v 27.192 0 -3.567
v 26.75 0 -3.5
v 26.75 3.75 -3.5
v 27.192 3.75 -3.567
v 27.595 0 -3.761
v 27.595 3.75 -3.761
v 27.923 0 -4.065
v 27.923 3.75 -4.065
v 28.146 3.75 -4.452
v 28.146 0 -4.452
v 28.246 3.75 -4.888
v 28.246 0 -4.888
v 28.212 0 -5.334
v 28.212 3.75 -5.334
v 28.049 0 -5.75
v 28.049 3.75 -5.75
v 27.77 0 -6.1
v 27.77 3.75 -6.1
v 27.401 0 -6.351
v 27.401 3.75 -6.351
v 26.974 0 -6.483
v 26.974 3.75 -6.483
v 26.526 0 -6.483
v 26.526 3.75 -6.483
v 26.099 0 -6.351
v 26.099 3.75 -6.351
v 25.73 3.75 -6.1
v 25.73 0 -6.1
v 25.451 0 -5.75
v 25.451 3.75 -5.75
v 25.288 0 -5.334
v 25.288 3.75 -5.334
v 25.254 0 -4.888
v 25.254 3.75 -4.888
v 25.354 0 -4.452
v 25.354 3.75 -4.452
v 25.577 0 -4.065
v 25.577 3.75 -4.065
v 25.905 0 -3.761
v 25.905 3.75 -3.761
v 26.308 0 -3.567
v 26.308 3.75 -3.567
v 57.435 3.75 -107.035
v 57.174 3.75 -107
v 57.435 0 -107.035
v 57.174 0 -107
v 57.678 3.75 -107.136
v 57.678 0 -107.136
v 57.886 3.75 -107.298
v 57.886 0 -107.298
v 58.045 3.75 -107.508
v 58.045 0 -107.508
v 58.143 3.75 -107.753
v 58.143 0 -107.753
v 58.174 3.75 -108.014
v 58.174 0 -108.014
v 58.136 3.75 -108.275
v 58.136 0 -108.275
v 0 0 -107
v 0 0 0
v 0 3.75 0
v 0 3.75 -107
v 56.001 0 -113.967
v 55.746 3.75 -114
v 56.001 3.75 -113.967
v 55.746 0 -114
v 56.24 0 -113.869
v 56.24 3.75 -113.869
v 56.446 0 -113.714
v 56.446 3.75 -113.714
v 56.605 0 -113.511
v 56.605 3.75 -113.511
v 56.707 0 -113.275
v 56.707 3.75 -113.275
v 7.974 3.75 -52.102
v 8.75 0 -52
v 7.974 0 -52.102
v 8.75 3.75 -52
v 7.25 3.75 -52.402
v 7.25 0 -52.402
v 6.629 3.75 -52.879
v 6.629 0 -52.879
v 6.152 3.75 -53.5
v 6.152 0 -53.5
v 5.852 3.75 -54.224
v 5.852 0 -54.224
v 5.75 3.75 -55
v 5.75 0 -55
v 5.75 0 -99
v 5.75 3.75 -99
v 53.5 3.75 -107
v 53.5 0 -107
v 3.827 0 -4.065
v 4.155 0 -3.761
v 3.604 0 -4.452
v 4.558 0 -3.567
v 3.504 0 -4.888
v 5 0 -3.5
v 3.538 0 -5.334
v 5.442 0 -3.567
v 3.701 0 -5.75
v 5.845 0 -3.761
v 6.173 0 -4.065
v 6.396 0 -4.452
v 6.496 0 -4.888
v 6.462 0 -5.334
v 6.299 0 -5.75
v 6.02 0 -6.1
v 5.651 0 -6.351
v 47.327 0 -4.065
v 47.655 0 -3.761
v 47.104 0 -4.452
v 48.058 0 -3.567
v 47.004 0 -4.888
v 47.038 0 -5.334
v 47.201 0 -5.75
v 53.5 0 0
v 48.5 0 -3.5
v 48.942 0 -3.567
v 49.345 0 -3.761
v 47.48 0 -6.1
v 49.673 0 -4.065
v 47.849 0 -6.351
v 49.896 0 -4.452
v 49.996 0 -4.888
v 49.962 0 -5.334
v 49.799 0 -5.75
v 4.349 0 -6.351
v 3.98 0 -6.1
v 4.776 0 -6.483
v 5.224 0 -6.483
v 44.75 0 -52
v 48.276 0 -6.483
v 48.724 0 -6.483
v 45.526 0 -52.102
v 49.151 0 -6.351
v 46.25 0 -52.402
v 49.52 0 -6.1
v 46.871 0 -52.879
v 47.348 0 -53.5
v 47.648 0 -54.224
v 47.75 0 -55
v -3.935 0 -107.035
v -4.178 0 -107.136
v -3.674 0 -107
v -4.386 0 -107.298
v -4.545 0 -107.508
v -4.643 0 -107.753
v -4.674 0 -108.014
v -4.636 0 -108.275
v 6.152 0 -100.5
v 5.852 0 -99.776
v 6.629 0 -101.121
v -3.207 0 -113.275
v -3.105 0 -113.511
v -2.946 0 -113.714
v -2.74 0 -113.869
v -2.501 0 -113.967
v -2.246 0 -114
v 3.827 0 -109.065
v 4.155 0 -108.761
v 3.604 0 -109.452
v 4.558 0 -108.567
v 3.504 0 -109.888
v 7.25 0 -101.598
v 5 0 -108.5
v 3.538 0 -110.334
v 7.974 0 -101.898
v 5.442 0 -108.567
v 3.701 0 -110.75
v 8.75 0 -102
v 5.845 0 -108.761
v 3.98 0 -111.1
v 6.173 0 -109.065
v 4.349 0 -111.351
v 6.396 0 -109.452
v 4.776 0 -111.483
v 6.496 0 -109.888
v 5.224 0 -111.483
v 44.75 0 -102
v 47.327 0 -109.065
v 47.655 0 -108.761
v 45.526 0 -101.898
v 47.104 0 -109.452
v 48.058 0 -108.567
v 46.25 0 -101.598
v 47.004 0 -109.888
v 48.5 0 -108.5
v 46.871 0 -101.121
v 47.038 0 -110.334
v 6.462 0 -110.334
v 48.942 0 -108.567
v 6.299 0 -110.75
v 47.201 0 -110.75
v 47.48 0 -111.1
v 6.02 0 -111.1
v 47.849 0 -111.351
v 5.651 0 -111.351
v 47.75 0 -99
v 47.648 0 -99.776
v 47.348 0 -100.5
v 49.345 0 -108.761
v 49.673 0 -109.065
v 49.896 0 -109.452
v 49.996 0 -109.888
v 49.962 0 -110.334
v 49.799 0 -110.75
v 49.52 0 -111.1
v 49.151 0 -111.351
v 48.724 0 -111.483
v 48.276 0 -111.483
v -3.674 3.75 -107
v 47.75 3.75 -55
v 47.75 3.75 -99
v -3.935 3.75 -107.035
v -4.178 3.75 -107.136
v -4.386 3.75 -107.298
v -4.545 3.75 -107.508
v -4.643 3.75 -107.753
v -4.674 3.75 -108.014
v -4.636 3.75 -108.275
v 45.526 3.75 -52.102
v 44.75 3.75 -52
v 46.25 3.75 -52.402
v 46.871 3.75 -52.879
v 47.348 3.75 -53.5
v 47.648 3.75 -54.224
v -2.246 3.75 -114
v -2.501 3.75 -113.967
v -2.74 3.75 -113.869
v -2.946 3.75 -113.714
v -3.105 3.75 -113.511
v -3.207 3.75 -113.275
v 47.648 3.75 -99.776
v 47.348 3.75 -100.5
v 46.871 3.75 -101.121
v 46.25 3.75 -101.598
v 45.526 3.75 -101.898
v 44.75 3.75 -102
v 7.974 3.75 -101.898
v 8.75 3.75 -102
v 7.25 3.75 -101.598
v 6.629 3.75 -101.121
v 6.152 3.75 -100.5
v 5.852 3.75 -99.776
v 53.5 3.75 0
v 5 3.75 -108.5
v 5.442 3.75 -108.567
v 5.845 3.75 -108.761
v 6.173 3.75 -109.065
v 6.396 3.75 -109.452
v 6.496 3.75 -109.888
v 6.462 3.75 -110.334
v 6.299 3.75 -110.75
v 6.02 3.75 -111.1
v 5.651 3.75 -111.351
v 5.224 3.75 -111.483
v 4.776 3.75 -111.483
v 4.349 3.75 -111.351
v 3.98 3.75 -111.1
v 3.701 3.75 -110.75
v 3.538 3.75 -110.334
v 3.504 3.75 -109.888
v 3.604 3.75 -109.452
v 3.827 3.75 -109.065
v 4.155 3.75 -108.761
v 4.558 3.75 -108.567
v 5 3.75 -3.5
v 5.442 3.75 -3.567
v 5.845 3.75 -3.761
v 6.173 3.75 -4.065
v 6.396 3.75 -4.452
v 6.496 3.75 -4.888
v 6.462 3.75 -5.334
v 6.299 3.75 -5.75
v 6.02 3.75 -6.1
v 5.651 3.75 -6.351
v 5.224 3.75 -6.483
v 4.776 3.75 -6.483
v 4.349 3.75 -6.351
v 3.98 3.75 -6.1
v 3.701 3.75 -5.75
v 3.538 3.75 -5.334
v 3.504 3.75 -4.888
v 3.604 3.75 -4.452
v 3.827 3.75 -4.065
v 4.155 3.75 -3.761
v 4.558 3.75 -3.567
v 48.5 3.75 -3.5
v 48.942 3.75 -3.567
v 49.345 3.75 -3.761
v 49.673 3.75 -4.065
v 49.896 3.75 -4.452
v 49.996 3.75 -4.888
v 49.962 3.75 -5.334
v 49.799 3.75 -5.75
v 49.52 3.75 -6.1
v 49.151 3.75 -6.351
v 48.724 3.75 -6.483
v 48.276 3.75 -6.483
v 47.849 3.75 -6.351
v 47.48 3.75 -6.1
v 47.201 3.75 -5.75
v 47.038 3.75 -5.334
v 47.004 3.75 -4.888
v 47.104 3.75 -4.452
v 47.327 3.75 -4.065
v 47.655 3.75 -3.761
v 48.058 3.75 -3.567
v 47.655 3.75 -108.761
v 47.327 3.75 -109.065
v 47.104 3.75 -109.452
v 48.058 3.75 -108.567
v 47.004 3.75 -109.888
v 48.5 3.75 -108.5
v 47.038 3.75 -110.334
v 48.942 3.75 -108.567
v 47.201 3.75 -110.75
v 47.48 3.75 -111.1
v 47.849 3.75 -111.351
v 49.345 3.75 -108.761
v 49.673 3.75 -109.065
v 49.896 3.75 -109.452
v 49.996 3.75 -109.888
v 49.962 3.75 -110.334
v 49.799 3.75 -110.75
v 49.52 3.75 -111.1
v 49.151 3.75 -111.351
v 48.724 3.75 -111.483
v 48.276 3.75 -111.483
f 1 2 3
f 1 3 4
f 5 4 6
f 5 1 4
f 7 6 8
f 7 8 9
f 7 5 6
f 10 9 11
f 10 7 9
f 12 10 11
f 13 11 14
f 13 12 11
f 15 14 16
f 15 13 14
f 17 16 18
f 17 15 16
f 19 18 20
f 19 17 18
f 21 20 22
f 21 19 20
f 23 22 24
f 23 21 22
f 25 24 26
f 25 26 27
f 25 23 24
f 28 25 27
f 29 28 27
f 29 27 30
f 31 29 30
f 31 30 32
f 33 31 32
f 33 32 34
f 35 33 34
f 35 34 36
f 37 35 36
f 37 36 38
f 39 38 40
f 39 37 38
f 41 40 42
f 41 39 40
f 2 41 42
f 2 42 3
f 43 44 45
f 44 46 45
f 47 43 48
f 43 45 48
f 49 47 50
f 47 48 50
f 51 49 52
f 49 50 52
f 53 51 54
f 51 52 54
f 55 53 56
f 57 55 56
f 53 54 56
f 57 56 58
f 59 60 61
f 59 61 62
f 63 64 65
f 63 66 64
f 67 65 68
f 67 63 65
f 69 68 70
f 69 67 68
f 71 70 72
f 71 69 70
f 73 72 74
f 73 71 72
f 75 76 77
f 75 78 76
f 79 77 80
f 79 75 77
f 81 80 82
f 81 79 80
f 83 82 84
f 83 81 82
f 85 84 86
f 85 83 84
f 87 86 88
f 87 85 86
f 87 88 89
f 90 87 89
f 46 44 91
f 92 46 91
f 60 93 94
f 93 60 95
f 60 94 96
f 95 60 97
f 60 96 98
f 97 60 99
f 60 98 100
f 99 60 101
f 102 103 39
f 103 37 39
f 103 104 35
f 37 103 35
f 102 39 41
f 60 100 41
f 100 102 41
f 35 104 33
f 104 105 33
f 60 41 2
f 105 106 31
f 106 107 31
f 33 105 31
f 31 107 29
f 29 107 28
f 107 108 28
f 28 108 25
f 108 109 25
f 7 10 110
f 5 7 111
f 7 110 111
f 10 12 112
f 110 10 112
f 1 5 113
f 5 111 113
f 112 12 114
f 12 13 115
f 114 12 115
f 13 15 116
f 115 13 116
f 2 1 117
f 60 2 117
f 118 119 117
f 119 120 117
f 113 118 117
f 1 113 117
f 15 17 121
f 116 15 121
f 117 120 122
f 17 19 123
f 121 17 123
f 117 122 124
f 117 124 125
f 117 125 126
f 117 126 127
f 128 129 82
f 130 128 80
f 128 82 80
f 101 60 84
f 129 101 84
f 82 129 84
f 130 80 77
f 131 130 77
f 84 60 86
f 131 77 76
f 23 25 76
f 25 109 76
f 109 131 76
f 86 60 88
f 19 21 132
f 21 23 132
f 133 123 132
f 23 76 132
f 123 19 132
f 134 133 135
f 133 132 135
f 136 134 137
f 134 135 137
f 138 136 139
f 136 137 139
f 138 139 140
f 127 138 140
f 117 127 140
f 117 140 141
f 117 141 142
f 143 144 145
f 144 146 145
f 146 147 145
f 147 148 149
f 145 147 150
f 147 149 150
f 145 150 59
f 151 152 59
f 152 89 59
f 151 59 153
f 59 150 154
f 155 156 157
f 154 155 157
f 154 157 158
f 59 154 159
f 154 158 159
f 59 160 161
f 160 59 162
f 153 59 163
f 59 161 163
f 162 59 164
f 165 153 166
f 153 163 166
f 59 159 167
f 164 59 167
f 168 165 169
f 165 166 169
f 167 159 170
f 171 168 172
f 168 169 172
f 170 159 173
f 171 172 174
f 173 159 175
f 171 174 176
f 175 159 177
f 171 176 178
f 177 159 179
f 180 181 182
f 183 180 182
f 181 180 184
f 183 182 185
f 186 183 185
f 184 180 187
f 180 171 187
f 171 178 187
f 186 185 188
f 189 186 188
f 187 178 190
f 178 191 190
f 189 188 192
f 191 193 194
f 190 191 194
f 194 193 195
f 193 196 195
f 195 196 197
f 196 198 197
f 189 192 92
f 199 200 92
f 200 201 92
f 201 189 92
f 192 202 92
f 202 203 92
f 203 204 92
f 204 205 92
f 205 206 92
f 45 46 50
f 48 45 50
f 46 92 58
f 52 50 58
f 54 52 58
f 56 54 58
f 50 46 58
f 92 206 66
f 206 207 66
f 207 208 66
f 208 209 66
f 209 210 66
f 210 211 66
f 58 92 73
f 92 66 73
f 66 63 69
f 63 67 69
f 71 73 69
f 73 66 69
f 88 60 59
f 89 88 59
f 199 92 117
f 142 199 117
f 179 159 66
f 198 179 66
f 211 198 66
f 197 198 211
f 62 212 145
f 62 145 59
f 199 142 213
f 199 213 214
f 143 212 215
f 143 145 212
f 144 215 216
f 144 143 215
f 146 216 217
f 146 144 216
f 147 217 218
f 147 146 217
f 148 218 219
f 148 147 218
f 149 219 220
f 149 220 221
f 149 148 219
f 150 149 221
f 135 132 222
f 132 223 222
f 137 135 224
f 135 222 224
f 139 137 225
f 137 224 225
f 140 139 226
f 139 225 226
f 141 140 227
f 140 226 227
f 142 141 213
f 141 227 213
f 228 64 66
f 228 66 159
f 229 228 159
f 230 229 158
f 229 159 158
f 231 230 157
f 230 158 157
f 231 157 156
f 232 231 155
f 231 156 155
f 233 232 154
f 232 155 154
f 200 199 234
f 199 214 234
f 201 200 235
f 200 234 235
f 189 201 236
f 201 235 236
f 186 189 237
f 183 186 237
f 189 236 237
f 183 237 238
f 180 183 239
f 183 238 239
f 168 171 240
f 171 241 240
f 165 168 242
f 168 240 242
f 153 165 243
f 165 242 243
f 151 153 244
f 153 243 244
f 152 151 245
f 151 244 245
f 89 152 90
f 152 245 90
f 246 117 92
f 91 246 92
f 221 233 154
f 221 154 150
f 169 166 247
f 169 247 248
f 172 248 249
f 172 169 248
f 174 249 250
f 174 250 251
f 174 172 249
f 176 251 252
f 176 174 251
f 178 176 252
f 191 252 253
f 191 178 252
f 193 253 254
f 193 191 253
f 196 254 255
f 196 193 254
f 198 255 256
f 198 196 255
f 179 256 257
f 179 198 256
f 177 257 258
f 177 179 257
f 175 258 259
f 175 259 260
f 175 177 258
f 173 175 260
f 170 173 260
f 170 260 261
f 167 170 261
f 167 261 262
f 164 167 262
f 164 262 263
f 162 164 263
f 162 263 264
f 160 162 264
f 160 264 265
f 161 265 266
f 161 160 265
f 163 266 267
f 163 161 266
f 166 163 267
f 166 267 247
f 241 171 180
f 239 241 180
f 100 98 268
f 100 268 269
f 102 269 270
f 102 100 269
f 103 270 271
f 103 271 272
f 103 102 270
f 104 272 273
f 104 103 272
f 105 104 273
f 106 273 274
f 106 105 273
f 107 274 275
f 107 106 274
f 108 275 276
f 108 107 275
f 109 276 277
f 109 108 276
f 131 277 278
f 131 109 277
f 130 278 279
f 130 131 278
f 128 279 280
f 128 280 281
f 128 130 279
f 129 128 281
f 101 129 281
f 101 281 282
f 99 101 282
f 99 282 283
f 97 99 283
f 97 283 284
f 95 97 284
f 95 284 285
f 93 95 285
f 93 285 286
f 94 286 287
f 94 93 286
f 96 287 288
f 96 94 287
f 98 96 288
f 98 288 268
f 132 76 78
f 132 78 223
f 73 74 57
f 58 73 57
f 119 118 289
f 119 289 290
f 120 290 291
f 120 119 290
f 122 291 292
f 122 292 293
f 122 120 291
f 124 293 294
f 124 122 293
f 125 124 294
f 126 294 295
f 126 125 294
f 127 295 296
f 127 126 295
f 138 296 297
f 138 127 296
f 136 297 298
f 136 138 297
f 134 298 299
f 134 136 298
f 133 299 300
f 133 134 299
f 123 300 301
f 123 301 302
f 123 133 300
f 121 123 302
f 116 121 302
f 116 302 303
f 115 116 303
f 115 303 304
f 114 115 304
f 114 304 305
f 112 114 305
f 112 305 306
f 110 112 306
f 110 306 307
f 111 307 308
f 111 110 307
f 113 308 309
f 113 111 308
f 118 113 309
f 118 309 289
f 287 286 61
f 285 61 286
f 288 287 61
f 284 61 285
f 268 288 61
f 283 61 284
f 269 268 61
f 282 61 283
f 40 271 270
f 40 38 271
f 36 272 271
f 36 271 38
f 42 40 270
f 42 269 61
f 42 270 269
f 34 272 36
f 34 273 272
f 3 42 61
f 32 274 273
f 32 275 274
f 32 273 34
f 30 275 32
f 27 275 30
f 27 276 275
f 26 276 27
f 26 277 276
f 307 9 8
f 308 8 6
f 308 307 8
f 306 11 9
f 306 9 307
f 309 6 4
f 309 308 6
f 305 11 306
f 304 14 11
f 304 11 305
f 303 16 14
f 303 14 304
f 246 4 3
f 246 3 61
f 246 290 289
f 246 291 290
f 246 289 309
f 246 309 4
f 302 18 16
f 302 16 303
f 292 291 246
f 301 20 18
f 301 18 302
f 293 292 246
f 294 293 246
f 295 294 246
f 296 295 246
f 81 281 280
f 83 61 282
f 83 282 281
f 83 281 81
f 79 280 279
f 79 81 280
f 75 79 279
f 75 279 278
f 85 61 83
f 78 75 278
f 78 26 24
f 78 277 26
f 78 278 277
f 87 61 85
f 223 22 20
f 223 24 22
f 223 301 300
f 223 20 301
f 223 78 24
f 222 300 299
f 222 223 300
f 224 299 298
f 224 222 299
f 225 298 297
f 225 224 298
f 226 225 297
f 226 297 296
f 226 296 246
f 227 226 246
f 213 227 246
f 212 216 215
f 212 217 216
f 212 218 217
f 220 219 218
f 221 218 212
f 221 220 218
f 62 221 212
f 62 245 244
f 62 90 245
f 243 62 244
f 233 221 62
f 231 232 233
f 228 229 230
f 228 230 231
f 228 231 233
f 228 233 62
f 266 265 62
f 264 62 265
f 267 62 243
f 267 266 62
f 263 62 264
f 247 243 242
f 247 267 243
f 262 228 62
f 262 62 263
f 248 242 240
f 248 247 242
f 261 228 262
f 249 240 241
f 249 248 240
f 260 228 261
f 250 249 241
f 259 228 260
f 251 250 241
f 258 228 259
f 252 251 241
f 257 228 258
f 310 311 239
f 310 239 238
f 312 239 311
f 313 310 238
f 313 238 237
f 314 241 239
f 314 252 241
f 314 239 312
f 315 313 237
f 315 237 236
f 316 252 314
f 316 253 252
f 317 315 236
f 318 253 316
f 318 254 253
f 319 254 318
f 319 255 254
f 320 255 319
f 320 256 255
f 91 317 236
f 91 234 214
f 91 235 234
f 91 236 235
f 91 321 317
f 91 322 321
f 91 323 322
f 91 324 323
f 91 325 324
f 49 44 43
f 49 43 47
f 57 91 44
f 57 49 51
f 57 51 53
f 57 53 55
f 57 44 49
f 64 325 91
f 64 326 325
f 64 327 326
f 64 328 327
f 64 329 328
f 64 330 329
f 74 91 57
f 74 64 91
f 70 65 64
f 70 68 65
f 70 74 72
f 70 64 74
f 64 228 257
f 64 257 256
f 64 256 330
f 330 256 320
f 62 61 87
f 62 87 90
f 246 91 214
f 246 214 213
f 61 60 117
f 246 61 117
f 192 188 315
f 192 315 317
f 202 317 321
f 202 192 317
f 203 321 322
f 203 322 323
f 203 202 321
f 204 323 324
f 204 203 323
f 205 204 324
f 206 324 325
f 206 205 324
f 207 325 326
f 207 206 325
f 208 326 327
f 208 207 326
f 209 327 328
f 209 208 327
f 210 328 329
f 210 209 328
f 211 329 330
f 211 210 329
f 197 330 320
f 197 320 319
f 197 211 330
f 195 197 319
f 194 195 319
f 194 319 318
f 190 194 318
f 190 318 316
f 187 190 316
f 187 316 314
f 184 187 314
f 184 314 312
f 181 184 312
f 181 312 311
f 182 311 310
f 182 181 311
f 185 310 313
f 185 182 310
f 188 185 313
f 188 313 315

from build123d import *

# Parameters (mm, degrees)
SKETCH1_W           = 53.5
SKETCH1_H           = 114
SKETCH1_R           = 1.5
SKETCH1_W_2         = 42
SKETCH1_H_2         = 50
BOSS_EXTRUDE1_DEPTH = 3.75
FILLET1_R           = 3
BOSS_EXTRUDE2_DEPTH = 3.75
FILLET2_R           = 1


with BuildPart() as part:
    # Sketch1 → Boss-Extrude1 (new body)
    with BuildSketch(Plane(origin=(0, 0, 0), x_dir=(1, 0, 0), z_dir=(0, 1, 0))):
        with Locations((26.75, 57)):
            Rectangle(SKETCH1_W, SKETCH1_H)
        with Locations(Location((5, 5, 0), (0, 0, 270))):
            Circle(SKETCH1_R, mode=Mode.SUBTRACT)
        with Locations(Location((48.5, 5, 0), (0, 0, 270))):
            Circle(SKETCH1_R, mode=Mode.SUBTRACT)
        with Locations(Location((26.75, 5, 0), (0, 0, 270))):
            Circle(SKETCH1_R, mode=Mode.SUBTRACT)
        with Locations(Location((5, 110, 0), (0, 0, 270))):
            Circle(SKETCH1_R, mode=Mode.SUBTRACT)
        with Locations(Location((48.5, 110, 0), (0, 0, 270))):
            Circle(SKETCH1_R, mode=Mode.SUBTRACT)
        with Locations((26.75, 77)):
            Rectangle(SKETCH1_W_2, SKETCH1_H_2, mode=Mode.SUBTRACT)
    extrude(amount=BOSS_EXTRUDE1_DEPTH)

    # Fillet1
    fillet1_edges = [part.edges().sort_by_distance(p)[0] for p in [
        (5.75, 1.875, -102),
        (5.75, 1.875, -52),
        (47.75, 1.875, -52),
        (47.75, 1.875, -102),
    ]]
    fillet(fillet1_edges, radius=FILLET1_R)

    # Sketch2 → Boss-Extrude2 (add)
    with BuildSketch(Plane(origin=(0, 3.75, 0), x_dir=(1, 0, 0), z_dir=(0, 1, 0))):
        Polygon((0, 114), (-3, 114), (-5, 107), (0, 107), align=None)
        Polygon((53.5, 114), (56.5, 114), (58.5, 107), (53.5, 107), align=None)
    extrude(amount=-BOSS_EXTRUDE2_DEPTH)

    # Fillet2
    fillet2_edges = [part.edges().sort_by_distance(p)[0] for p in [
        (56.5, 1.875, -114),
        (58.5, 1.875, -107),
        (-5, 1.875, -107),
        (-3, 1.875, -114),
    ]]
    fillet(fillet2_edges, radius=FILLET2_R)


solid = part.part
